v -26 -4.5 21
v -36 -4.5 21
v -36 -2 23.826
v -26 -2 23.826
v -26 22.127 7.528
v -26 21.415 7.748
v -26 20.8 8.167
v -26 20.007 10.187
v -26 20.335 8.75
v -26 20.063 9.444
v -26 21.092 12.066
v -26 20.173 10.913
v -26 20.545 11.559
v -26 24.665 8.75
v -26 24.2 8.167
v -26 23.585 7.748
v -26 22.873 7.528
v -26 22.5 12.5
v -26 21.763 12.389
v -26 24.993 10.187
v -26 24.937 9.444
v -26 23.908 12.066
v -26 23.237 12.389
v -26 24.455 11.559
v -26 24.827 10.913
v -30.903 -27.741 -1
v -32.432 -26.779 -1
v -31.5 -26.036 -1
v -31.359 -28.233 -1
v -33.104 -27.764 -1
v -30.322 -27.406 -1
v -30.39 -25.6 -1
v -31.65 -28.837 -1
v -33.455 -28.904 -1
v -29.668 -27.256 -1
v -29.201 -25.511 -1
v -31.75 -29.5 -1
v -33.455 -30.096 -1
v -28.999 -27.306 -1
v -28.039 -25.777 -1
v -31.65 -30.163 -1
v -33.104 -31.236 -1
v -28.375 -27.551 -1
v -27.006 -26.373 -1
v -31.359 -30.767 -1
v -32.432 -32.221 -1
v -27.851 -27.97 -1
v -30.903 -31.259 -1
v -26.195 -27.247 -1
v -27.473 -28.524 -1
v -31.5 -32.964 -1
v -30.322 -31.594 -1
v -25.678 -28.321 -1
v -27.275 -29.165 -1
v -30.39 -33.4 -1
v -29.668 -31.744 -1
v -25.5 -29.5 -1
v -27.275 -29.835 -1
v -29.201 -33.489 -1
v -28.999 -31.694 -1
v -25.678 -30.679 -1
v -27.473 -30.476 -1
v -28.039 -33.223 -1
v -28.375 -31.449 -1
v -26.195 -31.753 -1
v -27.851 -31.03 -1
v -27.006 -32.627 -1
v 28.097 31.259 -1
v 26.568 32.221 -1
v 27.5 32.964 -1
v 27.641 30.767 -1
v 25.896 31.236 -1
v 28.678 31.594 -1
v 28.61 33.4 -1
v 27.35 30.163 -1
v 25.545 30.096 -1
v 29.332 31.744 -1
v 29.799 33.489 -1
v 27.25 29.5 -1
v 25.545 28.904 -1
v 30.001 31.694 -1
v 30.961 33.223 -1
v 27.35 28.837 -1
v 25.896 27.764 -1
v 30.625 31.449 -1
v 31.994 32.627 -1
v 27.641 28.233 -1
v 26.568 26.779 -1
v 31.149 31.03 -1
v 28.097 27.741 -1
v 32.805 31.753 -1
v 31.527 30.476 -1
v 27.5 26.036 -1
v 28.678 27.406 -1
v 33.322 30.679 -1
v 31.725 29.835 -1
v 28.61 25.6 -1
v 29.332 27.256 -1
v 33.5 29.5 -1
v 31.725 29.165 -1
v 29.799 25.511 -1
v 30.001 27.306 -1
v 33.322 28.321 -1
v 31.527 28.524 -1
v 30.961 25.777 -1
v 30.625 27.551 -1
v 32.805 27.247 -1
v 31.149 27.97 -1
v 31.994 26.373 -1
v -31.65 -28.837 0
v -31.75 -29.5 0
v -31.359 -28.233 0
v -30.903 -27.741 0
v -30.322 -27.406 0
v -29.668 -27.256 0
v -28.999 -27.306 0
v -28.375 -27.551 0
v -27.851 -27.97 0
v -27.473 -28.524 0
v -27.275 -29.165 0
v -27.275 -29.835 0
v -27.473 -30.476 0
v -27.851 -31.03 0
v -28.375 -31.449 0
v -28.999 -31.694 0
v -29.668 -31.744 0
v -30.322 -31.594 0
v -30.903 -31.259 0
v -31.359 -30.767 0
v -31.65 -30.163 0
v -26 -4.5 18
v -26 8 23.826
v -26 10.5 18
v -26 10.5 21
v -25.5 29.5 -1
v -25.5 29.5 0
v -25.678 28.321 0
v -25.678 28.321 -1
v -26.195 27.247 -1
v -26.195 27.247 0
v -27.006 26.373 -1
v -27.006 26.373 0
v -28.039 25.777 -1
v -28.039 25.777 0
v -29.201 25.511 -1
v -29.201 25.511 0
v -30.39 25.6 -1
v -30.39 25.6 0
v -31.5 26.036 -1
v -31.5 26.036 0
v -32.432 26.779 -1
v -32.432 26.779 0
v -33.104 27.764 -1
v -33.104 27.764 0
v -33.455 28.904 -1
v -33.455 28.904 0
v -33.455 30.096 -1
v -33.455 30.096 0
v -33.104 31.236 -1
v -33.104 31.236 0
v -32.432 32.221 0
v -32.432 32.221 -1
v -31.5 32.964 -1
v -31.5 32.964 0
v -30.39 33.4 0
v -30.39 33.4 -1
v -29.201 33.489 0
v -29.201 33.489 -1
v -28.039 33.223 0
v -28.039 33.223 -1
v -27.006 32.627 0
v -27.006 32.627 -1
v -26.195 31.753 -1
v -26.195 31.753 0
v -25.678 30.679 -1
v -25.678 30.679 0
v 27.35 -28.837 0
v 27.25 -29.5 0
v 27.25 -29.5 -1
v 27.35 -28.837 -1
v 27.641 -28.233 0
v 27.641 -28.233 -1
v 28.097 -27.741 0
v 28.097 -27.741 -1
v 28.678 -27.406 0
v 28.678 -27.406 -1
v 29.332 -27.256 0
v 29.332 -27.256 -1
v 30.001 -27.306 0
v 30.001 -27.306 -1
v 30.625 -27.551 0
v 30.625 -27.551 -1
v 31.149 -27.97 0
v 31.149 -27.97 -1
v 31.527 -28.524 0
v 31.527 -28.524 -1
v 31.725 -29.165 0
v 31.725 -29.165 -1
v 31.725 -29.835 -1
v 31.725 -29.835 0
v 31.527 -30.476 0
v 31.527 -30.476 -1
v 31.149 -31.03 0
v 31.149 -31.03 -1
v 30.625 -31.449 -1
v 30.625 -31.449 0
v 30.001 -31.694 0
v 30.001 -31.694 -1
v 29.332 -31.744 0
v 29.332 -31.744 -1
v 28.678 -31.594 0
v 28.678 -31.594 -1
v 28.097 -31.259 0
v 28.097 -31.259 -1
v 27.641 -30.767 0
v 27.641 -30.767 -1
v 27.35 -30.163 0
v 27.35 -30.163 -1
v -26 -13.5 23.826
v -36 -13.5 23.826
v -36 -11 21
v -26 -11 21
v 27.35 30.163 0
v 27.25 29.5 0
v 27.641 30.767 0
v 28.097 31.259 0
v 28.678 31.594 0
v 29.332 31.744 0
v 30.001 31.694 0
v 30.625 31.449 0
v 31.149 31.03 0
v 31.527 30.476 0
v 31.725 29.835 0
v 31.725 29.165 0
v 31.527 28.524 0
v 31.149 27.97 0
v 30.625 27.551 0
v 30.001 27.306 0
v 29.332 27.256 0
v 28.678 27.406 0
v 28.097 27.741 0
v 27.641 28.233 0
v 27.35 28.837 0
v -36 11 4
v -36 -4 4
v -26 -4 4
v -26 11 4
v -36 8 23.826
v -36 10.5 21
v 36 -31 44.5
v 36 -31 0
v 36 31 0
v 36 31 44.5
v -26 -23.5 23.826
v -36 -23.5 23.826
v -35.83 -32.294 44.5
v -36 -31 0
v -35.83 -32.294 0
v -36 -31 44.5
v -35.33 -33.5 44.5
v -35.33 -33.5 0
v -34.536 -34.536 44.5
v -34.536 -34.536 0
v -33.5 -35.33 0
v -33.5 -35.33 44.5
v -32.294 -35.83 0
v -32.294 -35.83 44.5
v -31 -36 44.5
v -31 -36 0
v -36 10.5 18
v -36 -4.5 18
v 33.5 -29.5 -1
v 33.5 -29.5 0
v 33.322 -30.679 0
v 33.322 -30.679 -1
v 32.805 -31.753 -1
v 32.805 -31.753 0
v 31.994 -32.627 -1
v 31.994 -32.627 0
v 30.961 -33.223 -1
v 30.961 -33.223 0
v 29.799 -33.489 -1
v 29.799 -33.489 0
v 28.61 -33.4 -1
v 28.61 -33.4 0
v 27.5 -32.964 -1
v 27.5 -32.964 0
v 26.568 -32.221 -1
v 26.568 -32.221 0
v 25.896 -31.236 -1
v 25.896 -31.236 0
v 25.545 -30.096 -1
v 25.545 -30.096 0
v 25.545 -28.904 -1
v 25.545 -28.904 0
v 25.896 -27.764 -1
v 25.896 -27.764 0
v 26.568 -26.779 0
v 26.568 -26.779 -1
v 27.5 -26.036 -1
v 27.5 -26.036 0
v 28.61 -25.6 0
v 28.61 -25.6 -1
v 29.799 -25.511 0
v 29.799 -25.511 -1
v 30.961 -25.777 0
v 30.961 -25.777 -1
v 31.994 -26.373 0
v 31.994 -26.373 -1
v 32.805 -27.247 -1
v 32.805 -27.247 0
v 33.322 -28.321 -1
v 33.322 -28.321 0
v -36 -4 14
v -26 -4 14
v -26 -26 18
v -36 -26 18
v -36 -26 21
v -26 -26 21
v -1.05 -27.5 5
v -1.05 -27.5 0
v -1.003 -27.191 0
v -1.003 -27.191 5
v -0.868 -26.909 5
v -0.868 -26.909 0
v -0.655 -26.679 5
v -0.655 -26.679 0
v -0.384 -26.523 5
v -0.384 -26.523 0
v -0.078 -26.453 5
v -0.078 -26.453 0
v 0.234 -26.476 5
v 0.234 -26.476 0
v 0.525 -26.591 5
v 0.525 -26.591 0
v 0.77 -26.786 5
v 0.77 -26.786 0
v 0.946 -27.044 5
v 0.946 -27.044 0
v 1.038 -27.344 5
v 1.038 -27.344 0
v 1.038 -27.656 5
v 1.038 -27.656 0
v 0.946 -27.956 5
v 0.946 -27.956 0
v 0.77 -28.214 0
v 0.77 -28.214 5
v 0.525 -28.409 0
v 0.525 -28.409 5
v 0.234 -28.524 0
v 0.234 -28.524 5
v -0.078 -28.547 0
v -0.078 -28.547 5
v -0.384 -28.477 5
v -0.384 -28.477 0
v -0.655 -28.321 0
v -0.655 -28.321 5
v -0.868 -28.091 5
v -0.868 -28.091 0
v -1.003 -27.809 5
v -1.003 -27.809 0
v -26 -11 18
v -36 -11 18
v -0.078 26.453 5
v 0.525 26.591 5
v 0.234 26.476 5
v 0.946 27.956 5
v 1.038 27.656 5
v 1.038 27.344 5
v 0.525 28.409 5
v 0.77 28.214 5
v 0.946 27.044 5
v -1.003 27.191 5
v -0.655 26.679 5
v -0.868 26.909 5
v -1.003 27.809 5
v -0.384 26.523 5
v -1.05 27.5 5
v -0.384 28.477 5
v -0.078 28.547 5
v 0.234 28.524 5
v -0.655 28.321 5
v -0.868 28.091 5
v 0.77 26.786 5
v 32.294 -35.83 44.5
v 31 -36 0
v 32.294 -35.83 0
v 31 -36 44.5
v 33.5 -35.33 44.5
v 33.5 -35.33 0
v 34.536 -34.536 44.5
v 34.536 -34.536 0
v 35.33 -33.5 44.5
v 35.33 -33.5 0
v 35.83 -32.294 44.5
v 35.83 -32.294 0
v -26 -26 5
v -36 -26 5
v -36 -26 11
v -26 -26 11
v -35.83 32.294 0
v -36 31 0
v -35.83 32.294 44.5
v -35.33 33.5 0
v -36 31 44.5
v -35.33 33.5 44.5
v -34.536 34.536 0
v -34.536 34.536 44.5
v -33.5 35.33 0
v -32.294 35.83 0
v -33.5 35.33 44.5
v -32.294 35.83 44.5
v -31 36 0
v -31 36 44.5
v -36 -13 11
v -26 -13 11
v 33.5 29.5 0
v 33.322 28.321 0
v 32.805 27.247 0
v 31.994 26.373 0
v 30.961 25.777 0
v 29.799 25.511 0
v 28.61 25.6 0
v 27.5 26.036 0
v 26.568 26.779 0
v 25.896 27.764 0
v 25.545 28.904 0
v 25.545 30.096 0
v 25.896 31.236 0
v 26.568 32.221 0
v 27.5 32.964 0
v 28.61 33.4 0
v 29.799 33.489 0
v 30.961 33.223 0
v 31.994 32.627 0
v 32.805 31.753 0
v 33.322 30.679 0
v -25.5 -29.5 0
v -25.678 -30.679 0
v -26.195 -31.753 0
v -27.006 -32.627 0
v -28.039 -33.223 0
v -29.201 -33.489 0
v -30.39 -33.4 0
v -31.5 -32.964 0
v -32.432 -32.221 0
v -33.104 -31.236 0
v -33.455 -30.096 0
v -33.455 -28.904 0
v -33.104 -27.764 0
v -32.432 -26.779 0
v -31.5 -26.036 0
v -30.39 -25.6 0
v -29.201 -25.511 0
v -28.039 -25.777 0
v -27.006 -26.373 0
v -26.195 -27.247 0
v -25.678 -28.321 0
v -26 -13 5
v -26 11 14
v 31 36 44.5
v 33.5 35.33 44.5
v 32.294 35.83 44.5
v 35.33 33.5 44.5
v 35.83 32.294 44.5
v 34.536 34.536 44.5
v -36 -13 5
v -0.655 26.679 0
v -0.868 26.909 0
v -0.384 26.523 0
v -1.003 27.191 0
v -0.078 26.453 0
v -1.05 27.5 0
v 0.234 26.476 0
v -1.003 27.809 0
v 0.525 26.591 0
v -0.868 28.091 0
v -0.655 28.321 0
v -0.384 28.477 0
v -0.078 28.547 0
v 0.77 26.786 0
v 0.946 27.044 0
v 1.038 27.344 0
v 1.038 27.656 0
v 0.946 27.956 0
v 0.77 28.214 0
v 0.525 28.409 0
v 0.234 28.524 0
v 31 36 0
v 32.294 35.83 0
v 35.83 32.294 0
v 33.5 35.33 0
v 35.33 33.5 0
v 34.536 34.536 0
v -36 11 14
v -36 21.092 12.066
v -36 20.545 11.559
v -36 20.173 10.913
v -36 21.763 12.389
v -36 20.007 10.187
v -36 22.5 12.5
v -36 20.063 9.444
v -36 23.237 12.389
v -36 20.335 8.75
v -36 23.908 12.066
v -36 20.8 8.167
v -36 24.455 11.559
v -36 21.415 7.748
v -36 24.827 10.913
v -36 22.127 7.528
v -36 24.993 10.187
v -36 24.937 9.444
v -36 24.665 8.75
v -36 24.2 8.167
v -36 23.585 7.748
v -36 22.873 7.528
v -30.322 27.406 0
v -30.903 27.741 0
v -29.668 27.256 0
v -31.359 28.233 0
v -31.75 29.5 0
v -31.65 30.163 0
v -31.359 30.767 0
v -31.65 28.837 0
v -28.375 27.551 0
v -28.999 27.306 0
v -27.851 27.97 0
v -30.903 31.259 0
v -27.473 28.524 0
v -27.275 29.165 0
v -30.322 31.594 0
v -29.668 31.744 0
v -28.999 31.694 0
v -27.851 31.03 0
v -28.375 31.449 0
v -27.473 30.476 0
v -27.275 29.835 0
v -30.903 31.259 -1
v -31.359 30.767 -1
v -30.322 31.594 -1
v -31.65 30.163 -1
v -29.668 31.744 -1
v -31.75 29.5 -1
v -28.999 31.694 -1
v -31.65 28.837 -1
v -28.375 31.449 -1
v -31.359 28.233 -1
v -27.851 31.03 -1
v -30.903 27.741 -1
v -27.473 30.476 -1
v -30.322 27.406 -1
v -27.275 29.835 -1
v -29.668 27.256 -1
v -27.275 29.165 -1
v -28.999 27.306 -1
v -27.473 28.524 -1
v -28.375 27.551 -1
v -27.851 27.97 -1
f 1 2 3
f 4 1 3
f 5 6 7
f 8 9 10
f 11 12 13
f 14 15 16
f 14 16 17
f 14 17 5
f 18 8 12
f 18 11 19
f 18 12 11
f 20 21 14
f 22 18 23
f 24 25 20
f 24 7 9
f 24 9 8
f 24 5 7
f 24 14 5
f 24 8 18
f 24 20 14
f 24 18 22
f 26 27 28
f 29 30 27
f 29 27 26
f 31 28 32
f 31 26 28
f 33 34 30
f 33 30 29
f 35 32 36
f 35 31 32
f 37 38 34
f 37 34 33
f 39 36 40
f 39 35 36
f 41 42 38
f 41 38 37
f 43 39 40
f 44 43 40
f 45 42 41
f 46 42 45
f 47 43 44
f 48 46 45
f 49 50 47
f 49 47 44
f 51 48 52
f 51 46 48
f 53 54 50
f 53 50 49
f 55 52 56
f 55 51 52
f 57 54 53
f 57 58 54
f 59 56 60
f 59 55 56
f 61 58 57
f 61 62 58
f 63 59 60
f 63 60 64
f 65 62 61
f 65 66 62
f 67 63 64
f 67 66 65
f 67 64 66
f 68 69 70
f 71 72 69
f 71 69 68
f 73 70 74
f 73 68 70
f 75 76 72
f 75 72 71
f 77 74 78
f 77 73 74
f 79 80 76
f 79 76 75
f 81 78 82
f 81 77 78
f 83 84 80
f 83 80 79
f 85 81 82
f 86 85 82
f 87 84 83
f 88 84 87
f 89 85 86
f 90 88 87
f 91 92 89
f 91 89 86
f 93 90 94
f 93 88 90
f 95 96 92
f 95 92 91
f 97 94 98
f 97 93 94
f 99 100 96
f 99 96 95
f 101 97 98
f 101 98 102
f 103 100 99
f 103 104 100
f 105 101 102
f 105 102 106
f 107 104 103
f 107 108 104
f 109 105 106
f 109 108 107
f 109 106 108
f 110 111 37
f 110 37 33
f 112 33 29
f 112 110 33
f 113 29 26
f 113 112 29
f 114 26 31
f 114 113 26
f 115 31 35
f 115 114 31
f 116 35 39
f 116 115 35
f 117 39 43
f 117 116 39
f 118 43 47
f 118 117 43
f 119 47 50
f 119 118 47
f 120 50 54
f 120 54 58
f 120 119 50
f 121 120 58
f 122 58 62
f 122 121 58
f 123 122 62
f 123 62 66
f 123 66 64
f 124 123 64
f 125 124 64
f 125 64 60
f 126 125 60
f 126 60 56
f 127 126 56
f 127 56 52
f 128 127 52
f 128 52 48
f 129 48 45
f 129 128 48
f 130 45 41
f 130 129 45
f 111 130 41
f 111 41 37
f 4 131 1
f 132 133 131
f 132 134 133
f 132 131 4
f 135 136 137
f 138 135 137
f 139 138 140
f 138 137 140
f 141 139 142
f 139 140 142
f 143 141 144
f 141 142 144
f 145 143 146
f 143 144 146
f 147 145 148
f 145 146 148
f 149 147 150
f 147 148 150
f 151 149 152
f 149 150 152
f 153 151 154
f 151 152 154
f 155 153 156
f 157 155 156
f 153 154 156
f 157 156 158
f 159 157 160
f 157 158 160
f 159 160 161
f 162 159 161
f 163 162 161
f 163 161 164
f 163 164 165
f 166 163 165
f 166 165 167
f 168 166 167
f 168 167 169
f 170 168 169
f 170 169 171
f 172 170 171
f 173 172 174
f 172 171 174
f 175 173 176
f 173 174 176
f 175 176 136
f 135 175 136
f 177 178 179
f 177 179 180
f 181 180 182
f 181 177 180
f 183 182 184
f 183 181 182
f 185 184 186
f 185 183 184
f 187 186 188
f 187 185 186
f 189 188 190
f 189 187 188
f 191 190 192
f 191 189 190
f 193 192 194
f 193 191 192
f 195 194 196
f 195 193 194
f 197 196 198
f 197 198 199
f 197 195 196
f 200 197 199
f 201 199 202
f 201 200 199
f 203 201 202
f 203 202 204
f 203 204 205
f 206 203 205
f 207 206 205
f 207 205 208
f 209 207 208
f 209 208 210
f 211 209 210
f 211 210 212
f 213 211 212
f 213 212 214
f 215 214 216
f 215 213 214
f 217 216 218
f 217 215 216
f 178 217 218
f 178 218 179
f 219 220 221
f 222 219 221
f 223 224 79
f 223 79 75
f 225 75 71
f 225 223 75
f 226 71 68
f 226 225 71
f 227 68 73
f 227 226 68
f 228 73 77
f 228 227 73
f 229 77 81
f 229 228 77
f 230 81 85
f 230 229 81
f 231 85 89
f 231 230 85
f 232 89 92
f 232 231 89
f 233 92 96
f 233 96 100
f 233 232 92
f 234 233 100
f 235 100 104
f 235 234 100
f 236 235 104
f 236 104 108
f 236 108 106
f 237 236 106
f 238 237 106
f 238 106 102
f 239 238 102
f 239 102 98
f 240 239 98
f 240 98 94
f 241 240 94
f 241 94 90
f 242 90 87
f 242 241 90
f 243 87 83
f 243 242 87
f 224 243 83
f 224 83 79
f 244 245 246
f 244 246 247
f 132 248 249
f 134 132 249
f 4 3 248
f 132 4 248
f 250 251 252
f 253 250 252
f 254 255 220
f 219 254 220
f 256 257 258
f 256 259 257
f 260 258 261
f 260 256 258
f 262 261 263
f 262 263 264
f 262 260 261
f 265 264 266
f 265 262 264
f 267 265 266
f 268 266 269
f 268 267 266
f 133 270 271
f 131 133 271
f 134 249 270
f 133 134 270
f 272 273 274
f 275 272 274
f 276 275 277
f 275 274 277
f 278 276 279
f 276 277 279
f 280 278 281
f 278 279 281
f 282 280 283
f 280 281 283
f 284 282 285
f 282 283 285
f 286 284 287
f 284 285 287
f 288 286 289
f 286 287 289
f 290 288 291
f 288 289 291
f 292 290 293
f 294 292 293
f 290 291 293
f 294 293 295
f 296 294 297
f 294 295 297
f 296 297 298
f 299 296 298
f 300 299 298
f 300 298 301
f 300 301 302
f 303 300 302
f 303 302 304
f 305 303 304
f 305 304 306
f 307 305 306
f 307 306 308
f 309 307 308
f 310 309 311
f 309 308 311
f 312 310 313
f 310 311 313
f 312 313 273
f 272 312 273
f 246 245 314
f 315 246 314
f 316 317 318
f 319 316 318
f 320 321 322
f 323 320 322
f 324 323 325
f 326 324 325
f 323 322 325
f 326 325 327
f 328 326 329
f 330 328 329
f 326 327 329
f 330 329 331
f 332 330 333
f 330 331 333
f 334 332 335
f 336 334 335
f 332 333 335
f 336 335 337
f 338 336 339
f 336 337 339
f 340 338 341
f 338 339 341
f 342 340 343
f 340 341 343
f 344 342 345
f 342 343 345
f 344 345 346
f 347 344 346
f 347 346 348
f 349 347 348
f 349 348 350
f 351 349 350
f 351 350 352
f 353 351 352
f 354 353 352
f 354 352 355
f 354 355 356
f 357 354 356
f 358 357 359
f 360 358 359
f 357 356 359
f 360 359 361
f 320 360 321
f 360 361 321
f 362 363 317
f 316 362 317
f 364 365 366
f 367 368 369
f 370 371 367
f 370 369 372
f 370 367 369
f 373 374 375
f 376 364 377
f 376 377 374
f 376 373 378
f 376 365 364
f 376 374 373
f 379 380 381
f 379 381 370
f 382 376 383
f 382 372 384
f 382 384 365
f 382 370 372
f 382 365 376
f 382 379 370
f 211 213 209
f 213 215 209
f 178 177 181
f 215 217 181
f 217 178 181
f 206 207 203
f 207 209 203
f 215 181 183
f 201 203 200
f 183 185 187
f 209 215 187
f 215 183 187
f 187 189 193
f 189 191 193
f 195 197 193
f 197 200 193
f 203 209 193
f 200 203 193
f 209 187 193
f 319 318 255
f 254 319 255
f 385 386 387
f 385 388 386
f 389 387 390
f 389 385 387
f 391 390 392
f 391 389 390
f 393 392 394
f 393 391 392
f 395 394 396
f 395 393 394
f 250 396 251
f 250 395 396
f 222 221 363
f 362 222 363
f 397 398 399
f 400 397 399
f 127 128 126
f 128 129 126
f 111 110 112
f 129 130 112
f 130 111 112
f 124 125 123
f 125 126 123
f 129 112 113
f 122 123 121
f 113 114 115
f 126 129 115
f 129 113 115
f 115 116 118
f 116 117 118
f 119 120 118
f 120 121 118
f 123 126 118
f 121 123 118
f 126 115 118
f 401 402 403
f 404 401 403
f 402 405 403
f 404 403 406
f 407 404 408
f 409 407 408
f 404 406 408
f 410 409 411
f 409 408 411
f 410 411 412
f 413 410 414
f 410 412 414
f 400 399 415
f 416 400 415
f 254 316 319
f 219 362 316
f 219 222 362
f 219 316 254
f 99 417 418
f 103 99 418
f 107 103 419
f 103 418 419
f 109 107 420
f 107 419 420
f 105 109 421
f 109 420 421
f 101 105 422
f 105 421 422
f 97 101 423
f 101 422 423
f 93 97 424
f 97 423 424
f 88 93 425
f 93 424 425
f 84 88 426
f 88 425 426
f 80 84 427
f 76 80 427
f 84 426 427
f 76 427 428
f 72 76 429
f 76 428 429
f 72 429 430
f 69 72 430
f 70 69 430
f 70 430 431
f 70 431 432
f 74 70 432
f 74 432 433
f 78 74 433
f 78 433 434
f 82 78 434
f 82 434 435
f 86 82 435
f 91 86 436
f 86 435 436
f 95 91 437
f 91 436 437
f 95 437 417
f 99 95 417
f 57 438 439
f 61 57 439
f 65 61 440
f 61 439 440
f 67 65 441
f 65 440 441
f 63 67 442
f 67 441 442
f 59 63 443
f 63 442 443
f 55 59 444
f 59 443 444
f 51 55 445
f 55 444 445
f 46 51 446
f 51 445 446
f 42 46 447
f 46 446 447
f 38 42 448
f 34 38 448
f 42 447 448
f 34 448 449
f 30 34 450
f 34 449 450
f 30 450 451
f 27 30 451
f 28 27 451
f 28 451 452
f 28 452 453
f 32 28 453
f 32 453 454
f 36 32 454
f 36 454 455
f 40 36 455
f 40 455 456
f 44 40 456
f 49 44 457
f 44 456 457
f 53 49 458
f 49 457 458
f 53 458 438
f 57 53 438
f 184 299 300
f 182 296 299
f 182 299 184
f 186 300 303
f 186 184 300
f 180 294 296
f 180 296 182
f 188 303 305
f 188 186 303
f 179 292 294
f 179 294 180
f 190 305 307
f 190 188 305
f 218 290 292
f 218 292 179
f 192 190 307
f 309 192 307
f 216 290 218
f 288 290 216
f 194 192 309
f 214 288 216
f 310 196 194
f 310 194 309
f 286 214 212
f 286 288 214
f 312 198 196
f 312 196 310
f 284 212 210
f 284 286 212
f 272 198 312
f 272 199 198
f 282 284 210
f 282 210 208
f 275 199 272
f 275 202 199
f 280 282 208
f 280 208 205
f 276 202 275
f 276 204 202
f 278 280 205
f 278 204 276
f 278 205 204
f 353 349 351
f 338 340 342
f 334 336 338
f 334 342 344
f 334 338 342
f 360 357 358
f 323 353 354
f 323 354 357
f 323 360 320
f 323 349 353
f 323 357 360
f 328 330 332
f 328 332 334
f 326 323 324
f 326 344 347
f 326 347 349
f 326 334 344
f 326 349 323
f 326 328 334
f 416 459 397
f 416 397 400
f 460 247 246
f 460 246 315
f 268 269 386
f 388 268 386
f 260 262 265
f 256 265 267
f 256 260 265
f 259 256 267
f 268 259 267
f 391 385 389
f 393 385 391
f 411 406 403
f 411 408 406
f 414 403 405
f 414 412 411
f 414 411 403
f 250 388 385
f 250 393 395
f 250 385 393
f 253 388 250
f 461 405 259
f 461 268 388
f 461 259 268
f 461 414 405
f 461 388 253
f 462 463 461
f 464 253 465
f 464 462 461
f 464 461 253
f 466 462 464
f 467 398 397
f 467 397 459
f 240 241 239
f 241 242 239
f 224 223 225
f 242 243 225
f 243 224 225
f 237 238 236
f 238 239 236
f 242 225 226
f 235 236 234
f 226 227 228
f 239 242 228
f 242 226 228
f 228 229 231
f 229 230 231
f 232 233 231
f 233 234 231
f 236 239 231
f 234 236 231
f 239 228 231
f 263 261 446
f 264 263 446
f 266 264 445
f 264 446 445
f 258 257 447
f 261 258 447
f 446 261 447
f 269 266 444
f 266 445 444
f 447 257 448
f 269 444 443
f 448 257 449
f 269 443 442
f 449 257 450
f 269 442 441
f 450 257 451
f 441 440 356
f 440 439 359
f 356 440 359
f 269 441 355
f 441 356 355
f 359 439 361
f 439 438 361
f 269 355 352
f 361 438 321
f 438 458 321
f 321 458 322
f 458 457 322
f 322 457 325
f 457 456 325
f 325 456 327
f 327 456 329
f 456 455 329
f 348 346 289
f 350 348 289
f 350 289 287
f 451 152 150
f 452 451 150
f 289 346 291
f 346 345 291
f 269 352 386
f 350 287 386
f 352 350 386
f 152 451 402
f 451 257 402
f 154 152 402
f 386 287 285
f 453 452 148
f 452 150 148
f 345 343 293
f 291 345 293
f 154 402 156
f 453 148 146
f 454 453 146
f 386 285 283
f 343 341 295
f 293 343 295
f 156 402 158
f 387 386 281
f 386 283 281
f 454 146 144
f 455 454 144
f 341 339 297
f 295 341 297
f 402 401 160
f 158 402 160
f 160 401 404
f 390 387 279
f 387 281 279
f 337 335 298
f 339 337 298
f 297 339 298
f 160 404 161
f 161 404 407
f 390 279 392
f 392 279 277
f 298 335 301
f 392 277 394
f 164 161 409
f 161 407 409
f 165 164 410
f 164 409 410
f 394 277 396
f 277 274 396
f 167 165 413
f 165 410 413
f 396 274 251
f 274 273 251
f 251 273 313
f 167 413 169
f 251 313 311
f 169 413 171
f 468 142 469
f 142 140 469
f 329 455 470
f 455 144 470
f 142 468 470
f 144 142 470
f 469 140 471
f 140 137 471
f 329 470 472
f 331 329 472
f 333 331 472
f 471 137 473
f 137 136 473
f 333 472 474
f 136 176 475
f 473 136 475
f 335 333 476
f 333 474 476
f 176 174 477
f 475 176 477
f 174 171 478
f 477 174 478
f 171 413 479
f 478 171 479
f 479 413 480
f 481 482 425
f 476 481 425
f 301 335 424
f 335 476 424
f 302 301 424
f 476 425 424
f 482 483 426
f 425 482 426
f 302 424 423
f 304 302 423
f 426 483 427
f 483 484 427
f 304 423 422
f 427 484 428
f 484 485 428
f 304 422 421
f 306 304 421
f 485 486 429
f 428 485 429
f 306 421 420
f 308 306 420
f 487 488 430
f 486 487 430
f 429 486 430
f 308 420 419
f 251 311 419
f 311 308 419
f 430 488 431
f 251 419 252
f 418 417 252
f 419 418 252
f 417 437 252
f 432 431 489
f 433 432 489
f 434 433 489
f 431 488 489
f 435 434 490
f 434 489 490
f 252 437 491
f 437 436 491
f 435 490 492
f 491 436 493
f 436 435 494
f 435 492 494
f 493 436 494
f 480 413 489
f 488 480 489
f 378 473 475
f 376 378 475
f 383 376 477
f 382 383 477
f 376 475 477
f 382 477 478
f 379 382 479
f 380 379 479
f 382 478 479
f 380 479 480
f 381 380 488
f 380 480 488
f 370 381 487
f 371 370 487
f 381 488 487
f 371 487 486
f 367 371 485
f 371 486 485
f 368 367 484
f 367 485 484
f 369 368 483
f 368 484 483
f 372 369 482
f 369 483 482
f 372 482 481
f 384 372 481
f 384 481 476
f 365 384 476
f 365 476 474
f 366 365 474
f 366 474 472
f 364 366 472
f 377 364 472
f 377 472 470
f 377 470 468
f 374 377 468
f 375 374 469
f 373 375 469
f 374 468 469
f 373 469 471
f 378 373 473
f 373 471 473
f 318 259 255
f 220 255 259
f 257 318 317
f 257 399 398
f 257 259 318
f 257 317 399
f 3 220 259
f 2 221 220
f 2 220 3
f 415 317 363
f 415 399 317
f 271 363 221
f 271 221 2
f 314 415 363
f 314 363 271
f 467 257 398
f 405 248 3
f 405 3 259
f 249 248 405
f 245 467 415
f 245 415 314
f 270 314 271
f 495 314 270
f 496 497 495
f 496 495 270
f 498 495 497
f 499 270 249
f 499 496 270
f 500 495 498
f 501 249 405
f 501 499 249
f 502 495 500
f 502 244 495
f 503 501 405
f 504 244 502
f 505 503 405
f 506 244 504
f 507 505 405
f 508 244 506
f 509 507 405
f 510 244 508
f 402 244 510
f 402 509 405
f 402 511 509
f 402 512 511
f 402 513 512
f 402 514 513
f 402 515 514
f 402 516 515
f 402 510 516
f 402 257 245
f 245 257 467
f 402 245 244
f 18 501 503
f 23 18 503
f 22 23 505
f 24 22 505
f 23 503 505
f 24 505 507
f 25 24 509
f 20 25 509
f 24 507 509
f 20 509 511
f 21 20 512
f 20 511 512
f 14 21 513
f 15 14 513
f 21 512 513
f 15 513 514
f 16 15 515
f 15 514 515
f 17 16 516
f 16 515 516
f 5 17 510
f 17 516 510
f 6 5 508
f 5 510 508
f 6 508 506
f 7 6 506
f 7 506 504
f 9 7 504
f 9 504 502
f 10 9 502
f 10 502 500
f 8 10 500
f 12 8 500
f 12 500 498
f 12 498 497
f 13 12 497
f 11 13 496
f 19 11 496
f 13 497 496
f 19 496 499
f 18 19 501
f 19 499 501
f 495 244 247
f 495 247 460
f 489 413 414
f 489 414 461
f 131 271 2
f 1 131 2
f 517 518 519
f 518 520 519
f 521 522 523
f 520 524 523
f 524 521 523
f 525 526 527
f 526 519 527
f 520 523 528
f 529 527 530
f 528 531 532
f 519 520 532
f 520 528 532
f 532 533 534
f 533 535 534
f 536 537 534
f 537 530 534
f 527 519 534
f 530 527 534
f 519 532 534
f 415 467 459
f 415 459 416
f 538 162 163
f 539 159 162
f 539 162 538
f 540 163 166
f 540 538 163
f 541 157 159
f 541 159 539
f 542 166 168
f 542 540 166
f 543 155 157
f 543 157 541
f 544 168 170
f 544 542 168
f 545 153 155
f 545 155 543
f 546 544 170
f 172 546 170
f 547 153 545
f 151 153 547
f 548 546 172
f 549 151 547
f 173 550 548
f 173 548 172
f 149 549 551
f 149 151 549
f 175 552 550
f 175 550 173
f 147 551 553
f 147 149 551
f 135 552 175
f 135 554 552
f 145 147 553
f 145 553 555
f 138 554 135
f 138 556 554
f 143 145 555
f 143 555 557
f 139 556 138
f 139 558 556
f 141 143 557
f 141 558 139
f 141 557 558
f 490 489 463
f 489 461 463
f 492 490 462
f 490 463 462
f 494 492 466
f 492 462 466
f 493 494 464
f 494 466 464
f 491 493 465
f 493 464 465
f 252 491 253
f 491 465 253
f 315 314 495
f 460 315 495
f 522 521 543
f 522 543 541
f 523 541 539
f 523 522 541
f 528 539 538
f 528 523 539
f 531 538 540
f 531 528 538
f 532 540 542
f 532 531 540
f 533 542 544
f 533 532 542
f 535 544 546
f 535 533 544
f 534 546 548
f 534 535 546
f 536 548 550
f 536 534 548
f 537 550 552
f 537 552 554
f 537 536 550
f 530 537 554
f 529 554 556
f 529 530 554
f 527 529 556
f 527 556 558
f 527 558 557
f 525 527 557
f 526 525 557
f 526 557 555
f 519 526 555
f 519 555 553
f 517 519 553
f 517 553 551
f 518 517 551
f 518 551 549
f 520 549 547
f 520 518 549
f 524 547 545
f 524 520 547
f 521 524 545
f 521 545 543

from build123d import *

# Parameters (mm, degrees)
SKETCH_1_W          = 72
SKETCH_1_H          = 72
EXTRUDE_1_DEPTH     = 44.5
SKETCH_4_R          = 2.5
SKETCH_4_W          = 10
SKETCH_4_H          = 15
SKETCH_4_W_2        = 6
SKETCH_4_H_2        = 13
CUT_EXTRUDE_2_DEPTH = 10
FILLET_1_R          = 5
SKETCH_2_R          = 1.05
CUT_EXTRUDE_1_DEPTH = 5
SKETCH_3_R          = 4
SKETCH_3_R_2        = 2.25
EXTRUDE_2_DEPTH     = 1


with BuildPart() as part:
    # 草图1 → 凸台-拉伸1 (new body)
    with BuildSketch(Plane.XY):
        Rectangle(SKETCH_1_W, SKETCH_1_H)
    extrude(amount=EXTRUDE_1_DEPTH)

    # 草图4 → 切除-拉伸2 (cut)
    with BuildSketch(Plane.ZY.offset(36)):
        with Locations((10, 22.5)):
            Circle(SKETCH_4_R)
        with Locations((9, 3.5)):
            Rectangle(SKETCH_4_W, SKETCH_4_H)
        Polygon((18, -11), (18, -26), (21, -26), (23.826446608, -23.5), (23.826446608, -13.5), (21, -11), align=None)
        with Locations((8, -19.5)):
            Rectangle(SKETCH_4_W_2, SKETCH_4_H_2)
        Polygon((18, 10.5), (18, -4.5), (21, -4.5), (23.826446608, -2), (23.826446608, 8), (21, 10.5), align=None)
    extrude(amount=-CUT_EXTRUDE_2_DEPTH, mode=Mode.SUBTRACT)

    # 圆角1
    fillet_1_edges = [part.edges().sort_by_distance(p)[0] for p in [
        (36, -36, 22.25),
        (-36, -36, 22.25),
        (-36, 36, 22.25),
        (36, 36, 22.25),
    ]]
    fillet(fillet_1_edges, radius=FILLET_1_R)

    # 草图2 → 切除-拉伸1 (cut)
    with BuildSketch(Plane(origin=(0, 0, 0), x_dir=(-1, 0, 0), z_dir=(0, 0, -1))):
        with Locations((0, 27.5)):
            Circle(SKETCH_2_R)
        with Locations((0, -27.5)):
            Circle(SKETCH_2_R)
    extrude(amount=-CUT_EXTRUDE_1_DEPTH, mode=Mode.SUBTRACT)

    # 草图3 → 凸台-拉伸2 (add)
    # profile 1 of 4: a face of its own
    with BuildSketch(Plane(origin=(0, 0, 0), x_dir=(-1, 0, 0), z_dir=(0, 0, -1))):
        with Locations(Location((29.5, -29.5, 0), (0, 0, 180))):
            Circle(SKETCH_3_R)
        with Locations((29.5, -29.5)):
            Circle(SKETCH_3_R_2, mode=Mode.SUBTRACT)
    # profile 2 of 4: a face of its own
    with BuildSketch(Plane(origin=(0, 0, 0), x_dir=(-1, 0, 0), z_dir=(0, 0, -1))):
        with Locations(Location((-29.5, -29.5, 0), (0, 0, 180))):
            Circle(SKETCH_3_R)
        with Locations((-29.5, -29.5)):
            Circle(SKETCH_3_R_2, mode=Mode.SUBTRACT)
    # profile 3 of 4: a face of its own
    with BuildSketch(Plane(origin=(0, 0, 0), x_dir=(-1, 0, 0), z_dir=(0, 0, -1))):
        with Locations(Location((-29.5, 29.5, 0), (0, 0, 180))):
            Circle(SKETCH_3_R)
        with Locations((-29.5, 29.5)):
            Circle(SKETCH_3_R_2, mode=Mode.SUBTRACT)
    # profile 4 of 4: a face of its own
    with BuildSketch(Plane(origin=(0, 0, 0), x_dir=(-1, 0, 0), z_dir=(0, 0, -1))):
        with Locations(Location((29.5, 29.5, 0), (0, 0, 180))):
            Circle(SKETCH_3_R)
        with Locations((29.5, 29.5)):
            Circle(SKETCH_3_R_2, mode=Mode.SUBTRACT)
    extrude(amount=EXTRUDE_2_DEPTH)


solid = part.part
